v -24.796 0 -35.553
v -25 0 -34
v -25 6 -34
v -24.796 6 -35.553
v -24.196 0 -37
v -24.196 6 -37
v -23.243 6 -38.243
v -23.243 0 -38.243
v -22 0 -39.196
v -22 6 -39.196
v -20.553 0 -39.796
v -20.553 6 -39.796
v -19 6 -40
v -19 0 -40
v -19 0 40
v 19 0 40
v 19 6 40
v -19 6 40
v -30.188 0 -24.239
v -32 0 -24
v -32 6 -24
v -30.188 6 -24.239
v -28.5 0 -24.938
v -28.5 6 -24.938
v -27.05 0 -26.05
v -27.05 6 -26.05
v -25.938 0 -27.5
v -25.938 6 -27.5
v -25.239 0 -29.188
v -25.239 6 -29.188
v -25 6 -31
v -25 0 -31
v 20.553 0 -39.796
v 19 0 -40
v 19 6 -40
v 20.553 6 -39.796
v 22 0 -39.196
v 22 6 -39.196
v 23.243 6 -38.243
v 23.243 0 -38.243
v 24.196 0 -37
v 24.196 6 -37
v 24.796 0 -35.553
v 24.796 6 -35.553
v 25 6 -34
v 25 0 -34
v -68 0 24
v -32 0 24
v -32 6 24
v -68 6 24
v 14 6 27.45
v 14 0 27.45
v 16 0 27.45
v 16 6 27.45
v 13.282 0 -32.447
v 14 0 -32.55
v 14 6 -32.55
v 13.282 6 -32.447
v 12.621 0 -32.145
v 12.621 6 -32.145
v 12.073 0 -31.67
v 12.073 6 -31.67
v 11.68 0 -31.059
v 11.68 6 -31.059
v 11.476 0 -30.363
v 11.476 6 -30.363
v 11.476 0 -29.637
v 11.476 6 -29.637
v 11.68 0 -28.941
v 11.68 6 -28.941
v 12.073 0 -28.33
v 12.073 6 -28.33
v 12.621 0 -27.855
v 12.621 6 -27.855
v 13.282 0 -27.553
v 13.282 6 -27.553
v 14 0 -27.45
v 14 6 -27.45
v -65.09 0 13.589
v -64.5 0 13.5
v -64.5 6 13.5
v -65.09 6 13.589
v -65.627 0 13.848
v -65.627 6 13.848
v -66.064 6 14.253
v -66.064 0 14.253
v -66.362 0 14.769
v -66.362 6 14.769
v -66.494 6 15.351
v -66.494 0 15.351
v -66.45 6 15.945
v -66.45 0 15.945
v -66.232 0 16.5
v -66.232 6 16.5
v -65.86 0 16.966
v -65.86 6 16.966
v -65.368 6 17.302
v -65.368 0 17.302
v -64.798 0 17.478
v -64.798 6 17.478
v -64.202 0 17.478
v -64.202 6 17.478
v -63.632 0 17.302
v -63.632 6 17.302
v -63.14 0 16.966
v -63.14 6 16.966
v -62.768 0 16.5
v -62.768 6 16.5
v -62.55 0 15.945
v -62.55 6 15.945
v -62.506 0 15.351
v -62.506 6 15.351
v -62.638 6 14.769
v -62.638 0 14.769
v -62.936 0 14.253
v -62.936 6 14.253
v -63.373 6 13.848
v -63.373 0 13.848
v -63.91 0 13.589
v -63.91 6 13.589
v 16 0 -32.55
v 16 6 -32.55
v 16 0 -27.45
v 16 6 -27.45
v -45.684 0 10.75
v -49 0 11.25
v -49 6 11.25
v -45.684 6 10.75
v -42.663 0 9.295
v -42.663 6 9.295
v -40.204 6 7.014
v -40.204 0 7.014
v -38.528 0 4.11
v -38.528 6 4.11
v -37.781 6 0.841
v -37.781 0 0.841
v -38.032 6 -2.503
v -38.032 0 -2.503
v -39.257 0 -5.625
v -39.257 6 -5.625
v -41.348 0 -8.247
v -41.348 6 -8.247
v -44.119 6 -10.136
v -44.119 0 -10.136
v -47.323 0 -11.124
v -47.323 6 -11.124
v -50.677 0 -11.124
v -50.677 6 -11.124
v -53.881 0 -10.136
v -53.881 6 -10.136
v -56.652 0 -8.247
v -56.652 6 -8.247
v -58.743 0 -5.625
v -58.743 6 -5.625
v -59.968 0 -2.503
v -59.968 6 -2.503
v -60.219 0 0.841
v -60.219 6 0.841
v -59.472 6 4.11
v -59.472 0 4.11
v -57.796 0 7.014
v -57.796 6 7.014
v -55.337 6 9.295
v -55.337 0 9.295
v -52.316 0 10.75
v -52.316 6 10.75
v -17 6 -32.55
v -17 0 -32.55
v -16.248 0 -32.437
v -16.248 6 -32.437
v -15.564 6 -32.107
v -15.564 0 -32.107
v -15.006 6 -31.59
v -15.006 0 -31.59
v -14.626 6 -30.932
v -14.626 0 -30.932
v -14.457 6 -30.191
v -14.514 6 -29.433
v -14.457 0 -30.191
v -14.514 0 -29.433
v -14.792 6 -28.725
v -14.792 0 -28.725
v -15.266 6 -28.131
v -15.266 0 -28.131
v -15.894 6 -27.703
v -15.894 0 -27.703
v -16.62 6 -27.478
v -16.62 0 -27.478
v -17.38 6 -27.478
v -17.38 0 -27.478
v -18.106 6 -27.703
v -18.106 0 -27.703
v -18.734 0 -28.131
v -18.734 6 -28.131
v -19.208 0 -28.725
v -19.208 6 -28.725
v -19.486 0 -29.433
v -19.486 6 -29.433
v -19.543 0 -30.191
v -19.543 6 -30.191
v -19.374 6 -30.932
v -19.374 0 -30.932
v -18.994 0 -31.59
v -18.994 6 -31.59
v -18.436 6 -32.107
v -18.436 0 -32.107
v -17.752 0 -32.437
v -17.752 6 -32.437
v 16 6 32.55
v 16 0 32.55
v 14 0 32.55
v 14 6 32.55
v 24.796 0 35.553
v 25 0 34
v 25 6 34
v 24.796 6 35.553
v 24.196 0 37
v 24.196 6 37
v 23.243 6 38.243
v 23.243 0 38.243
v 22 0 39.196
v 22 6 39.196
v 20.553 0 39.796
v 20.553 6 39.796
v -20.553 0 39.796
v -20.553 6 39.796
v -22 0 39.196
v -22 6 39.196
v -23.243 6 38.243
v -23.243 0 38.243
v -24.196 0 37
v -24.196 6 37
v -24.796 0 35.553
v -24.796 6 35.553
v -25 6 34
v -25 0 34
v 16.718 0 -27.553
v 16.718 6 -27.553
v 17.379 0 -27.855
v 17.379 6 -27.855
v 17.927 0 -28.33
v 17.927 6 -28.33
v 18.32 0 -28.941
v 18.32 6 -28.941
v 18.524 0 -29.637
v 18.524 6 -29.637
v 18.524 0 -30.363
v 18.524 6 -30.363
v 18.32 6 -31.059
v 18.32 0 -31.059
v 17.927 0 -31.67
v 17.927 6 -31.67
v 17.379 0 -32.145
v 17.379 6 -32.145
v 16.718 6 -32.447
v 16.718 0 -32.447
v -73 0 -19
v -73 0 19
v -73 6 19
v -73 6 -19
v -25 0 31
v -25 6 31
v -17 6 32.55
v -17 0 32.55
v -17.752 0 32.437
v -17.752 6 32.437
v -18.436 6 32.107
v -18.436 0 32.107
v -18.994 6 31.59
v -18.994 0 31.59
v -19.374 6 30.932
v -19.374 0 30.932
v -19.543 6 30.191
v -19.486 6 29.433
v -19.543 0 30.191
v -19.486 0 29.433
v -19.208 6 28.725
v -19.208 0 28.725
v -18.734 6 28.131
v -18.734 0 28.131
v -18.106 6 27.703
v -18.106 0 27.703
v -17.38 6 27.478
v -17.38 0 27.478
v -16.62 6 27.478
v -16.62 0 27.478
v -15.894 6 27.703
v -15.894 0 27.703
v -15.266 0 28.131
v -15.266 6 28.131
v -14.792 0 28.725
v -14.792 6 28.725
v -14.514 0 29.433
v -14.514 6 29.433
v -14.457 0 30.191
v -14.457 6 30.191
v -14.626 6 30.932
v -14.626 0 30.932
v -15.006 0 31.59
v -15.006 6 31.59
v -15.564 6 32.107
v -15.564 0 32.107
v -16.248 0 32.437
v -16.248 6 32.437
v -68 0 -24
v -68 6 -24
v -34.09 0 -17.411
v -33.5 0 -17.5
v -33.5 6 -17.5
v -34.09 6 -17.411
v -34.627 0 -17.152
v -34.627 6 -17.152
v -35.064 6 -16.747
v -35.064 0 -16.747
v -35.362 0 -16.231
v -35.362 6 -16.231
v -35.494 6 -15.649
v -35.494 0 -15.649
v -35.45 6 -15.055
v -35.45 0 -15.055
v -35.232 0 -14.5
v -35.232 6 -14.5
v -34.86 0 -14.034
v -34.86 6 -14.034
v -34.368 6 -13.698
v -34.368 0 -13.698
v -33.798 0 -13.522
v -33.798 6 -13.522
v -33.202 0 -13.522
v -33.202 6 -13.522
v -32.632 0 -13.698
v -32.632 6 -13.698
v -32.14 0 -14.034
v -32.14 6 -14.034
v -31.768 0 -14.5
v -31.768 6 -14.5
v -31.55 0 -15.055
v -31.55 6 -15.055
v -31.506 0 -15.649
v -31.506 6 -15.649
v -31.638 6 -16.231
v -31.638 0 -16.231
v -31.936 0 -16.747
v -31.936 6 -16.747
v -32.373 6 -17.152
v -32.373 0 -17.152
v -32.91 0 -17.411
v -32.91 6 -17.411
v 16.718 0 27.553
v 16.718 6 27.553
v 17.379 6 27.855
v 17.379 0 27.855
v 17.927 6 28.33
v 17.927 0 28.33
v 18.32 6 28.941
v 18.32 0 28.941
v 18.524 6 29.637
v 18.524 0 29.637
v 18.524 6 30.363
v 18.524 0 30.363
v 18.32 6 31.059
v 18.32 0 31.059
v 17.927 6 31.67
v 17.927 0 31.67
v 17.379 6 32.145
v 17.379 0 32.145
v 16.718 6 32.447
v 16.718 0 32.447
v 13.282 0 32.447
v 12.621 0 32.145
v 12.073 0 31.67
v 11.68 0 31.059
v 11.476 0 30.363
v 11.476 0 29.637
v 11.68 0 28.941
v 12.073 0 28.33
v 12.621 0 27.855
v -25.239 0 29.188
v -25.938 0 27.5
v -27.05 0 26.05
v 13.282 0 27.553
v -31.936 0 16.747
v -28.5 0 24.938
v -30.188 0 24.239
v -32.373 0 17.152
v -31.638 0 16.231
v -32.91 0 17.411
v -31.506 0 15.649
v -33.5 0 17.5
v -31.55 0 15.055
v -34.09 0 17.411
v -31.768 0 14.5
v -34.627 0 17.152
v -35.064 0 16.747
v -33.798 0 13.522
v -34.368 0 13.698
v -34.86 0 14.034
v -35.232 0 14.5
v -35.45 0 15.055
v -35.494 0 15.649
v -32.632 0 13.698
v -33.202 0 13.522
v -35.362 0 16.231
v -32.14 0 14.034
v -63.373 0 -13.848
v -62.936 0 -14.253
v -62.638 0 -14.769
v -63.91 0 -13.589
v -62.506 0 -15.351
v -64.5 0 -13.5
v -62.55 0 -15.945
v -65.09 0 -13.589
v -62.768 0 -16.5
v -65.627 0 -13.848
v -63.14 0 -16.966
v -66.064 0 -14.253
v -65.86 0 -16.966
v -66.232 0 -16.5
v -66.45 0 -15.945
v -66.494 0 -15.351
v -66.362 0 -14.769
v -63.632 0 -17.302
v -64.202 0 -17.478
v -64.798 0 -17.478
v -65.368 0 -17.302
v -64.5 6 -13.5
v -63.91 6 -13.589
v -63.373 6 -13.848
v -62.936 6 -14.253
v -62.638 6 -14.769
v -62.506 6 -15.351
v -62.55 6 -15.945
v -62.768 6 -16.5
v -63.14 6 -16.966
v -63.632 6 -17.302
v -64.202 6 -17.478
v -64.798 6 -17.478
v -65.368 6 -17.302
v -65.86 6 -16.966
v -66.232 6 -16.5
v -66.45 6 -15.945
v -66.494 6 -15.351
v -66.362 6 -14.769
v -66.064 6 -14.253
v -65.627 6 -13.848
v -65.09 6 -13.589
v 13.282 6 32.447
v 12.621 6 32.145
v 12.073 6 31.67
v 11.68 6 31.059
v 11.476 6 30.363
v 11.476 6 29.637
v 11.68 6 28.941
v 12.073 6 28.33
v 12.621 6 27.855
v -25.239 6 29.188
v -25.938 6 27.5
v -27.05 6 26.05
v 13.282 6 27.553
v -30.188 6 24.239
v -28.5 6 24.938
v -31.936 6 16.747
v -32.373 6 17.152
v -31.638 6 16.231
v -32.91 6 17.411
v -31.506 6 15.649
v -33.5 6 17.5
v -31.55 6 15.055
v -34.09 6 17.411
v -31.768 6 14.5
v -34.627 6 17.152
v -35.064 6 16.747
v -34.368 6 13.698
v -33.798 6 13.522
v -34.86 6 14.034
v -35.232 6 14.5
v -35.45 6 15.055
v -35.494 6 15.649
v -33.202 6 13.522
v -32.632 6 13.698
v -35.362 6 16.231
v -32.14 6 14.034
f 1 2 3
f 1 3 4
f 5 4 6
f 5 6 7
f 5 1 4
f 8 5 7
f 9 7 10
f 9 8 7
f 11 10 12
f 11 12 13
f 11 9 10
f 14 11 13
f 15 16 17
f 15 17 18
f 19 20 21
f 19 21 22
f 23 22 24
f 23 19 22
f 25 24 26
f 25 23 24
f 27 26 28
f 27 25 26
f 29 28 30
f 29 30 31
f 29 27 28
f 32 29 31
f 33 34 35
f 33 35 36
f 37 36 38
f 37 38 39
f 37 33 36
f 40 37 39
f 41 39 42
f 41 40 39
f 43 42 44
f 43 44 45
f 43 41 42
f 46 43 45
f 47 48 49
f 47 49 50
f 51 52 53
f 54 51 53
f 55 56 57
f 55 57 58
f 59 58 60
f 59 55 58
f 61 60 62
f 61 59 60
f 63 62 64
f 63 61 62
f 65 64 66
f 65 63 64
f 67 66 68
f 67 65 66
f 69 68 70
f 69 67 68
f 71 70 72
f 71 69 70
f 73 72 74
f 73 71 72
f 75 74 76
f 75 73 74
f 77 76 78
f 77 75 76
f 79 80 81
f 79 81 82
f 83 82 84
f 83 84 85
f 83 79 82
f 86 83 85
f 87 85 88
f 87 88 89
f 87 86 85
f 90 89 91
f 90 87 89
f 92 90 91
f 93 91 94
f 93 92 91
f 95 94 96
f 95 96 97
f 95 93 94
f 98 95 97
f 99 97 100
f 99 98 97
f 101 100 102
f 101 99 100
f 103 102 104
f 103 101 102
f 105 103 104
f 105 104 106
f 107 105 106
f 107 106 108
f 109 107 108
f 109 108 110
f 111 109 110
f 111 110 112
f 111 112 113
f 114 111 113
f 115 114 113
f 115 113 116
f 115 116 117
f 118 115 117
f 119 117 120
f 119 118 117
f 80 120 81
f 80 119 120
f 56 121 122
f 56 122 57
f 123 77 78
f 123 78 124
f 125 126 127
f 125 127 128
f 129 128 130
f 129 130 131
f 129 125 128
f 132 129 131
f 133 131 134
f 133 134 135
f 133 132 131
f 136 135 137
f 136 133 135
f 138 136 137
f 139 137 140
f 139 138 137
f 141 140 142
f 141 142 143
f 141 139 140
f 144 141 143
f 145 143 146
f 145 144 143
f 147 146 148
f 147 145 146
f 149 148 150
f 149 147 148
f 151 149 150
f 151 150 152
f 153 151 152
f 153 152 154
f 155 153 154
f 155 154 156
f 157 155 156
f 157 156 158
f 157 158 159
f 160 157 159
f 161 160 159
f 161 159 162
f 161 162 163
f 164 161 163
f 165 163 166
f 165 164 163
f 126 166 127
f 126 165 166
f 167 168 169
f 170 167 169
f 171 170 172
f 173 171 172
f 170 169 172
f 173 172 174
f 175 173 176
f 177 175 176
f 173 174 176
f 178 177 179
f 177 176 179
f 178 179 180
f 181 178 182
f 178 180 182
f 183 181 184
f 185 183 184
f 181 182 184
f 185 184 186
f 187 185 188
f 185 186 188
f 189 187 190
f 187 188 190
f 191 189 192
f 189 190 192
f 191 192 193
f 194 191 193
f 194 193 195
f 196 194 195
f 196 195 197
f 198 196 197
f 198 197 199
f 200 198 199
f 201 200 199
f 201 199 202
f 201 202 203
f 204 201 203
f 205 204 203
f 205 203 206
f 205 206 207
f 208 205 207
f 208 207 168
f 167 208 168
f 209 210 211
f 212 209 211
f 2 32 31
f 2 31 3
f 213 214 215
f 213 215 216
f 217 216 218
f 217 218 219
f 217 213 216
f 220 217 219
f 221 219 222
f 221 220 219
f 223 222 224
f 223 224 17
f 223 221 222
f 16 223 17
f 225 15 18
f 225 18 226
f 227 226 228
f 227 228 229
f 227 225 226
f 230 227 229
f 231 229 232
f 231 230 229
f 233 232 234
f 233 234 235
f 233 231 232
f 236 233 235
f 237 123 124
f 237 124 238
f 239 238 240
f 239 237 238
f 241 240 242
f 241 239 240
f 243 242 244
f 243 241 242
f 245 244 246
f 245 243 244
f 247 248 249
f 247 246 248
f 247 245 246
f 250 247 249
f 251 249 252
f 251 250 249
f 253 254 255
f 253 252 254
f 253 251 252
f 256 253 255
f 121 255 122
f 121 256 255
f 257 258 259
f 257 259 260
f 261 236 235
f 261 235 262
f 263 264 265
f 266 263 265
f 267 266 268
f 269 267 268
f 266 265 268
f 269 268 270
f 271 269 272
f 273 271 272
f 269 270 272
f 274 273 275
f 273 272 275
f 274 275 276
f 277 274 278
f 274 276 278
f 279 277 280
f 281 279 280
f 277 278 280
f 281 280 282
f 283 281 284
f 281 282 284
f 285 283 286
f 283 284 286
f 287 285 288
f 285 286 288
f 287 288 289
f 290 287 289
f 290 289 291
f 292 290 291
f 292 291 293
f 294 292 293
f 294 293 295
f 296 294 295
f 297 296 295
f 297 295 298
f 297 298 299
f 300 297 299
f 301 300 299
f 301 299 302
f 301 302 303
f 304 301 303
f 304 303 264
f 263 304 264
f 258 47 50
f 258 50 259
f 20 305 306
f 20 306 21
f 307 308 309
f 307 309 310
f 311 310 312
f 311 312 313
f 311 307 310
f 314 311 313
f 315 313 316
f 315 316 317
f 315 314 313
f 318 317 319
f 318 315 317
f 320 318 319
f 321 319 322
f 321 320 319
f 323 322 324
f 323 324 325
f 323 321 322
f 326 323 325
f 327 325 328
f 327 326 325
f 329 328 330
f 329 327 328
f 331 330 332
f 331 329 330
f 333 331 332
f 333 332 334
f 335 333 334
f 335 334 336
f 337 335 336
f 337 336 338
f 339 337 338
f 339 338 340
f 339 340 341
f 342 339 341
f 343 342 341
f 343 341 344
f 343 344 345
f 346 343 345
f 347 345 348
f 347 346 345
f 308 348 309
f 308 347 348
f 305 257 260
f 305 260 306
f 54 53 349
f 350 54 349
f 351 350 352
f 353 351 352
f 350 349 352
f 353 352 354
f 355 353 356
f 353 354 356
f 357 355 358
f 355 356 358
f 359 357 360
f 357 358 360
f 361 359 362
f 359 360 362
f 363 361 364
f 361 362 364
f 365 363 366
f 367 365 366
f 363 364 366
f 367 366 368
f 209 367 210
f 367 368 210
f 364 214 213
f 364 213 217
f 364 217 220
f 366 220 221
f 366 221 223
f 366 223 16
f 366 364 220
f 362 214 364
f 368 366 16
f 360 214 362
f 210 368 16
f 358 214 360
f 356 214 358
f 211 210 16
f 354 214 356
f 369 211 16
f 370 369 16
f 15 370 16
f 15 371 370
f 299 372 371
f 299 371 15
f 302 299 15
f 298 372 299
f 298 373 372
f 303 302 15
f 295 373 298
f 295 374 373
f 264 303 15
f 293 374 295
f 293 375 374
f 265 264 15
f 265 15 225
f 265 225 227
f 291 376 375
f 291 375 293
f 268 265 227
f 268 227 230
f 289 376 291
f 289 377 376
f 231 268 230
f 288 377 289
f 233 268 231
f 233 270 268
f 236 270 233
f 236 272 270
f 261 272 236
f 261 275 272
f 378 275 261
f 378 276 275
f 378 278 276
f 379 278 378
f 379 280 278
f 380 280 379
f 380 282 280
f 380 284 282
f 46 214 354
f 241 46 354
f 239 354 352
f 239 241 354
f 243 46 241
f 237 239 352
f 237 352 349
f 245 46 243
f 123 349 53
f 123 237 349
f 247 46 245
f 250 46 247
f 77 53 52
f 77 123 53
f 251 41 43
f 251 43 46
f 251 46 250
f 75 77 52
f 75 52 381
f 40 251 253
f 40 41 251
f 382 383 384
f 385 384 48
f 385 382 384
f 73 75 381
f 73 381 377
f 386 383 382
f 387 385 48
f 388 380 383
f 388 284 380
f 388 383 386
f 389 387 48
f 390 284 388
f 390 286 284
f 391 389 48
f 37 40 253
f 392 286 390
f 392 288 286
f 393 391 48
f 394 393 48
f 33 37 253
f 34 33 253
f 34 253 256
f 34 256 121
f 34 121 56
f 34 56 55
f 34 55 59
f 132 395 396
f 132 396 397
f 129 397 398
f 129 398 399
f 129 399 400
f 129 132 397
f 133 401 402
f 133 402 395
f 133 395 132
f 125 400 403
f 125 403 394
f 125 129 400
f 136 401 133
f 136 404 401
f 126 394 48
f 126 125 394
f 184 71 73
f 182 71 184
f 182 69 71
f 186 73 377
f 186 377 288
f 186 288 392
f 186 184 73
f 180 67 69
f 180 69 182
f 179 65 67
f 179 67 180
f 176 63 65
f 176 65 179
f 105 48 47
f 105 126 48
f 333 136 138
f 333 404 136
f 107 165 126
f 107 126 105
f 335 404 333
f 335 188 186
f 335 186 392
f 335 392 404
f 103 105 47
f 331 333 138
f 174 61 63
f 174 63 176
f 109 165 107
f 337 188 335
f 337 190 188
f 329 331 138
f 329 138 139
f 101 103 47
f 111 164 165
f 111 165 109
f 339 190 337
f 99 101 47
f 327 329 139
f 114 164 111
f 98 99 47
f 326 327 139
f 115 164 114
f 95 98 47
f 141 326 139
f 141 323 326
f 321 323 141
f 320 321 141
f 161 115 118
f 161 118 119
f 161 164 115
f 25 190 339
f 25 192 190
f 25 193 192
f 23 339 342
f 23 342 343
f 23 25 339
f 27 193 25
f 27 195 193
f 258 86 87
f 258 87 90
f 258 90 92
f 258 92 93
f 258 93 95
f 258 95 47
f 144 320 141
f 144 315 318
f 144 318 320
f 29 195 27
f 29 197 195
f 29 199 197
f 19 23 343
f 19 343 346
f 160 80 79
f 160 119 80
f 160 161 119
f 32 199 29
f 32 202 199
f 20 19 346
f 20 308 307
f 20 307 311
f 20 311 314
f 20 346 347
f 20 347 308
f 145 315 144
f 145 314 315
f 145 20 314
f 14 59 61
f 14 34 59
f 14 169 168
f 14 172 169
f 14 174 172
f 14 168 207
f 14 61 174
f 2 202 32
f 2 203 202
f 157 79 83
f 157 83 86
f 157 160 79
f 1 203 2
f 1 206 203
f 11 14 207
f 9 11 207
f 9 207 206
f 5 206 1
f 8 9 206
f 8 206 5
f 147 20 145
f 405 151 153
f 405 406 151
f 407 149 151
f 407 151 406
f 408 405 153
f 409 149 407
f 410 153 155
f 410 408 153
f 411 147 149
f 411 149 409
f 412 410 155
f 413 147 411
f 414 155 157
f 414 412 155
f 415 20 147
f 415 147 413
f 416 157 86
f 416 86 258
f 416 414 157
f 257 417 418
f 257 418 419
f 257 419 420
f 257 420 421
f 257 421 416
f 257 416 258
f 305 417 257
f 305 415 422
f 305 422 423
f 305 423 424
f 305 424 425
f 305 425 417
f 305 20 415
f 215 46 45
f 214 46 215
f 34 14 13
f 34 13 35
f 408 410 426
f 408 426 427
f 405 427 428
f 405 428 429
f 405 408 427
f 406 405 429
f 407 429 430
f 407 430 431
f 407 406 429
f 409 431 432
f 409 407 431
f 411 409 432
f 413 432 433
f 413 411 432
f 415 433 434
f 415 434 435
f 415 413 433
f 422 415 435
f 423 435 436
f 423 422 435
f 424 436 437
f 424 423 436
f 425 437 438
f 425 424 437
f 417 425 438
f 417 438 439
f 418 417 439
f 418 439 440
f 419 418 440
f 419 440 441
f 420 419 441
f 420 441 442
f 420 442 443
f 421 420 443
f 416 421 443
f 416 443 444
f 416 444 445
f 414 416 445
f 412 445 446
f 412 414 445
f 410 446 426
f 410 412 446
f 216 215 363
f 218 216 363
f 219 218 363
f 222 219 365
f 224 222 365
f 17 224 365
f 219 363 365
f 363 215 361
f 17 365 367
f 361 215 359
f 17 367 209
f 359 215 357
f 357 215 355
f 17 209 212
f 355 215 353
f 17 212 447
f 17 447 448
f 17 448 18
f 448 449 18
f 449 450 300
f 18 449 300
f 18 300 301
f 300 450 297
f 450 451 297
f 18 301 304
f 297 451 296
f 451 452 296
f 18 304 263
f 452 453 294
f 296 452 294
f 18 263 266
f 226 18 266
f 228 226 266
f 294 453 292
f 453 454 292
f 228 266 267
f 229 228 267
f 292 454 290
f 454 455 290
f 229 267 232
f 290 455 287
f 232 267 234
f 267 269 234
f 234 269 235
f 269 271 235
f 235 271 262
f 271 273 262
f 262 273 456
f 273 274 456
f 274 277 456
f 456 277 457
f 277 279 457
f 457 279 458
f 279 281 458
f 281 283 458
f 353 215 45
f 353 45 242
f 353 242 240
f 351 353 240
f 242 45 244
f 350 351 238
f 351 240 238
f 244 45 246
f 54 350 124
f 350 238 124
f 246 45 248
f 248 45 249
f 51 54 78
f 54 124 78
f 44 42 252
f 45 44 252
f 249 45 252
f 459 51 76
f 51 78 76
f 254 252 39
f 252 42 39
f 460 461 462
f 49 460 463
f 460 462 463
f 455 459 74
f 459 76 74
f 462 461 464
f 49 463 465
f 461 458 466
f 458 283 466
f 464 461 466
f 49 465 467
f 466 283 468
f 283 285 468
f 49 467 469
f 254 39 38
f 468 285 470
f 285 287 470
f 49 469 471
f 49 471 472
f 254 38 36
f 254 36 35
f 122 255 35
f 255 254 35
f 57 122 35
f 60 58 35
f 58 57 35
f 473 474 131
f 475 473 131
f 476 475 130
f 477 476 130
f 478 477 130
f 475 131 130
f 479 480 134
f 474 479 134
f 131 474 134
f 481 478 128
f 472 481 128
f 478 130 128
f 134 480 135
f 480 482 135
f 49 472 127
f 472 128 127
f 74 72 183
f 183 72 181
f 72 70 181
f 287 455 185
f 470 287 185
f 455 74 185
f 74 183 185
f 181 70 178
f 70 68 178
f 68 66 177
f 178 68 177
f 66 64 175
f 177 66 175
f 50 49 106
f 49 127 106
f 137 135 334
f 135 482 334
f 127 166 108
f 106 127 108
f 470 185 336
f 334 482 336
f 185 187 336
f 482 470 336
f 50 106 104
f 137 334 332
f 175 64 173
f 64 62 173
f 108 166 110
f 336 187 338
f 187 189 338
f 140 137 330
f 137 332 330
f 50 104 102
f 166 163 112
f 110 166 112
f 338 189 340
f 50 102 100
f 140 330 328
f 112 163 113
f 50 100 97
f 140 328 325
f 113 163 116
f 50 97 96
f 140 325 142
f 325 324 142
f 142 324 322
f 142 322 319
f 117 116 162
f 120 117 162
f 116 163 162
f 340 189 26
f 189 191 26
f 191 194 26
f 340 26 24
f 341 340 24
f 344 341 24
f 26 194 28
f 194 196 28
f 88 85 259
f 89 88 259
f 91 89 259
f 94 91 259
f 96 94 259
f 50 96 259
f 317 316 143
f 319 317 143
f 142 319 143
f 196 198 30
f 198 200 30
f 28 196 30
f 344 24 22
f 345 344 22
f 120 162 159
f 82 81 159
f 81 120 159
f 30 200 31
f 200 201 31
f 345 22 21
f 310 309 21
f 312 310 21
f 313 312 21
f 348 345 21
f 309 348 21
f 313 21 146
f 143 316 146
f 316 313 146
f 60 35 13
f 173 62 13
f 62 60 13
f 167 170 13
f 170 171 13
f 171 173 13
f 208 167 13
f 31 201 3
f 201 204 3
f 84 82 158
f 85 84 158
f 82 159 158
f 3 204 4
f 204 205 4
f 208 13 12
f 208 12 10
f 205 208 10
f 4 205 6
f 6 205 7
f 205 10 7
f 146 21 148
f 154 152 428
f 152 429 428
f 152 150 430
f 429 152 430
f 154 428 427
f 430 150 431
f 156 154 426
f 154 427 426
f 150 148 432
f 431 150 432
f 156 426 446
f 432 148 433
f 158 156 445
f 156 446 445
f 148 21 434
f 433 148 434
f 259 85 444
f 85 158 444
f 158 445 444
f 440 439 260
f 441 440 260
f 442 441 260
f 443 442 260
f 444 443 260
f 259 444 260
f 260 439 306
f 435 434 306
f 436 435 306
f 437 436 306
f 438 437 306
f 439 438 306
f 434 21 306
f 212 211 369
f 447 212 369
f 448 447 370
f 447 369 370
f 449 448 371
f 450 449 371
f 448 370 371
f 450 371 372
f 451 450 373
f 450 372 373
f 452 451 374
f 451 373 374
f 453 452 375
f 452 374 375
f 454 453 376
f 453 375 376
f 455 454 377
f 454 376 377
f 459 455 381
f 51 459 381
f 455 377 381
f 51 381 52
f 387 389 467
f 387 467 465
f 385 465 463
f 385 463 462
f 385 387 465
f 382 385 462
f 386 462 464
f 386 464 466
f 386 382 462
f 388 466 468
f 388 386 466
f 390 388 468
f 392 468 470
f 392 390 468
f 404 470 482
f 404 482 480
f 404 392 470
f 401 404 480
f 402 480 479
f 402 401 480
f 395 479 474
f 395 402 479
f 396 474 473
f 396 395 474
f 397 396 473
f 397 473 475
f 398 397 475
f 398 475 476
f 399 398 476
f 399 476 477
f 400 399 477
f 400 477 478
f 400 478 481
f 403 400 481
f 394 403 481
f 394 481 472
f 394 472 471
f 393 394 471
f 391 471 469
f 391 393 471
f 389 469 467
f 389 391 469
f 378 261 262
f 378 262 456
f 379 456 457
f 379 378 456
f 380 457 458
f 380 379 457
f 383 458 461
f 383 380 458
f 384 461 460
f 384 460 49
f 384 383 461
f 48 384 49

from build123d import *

# Parameters (mm, degrees)
SKETCH_1_R          = 11.25
SKETCH_1_R_2        = 2
EXTRUDE_1_DEPTH     = 6
SKETCH_2_R          = 2.55
CUT_EXTRUDE_1_DEPTH = 84.456575535


with BuildPart() as part:
    # Эскиз1 → Бобышка-Вытянуть1 (new body)
    with BuildSketch(Plane(origin=(0, 0, 0), x_dir=(1, 0, 0), z_dir=(0, 1, 0))):
        with BuildLine():
            Line((-32, -24), (-68, -24))
            Line((-68, -24), (-73, -19))
            Line((-73, -19), (-73, 19))
            Line((-73, 19), (-68, 24))
            Line((-68, 24), (-32, 24))
            ThreePointArc((-32, 24), (-27.050252532, 26.050252532), (-25, 31))
            Line((-25, 31), (-25, 34))
            ThreePointArc((-25, 34), (-23.242640687, 38.242640687), (-19, 40))
            Line((-19, 40), (19, 40))
            ThreePointArc((19, 40), (23.242640687, 38.242640687), (25, 34))
            Line((25, 34), (25, -34))
            ThreePointArc((25, -34), (23.242640687, -38.242640687), (19, -40))
            Line((19, -40), (-19, -40))
            ThreePointArc((-19, -40), (-23.242640687, -38.242640687), (-25, -34))
            Line((-25, -34), (-25, -31))
            ThreePointArc((-25, -31), (-27.050252532, -26.050252532), (-32, -24))
        make_face()
        with Locations(Location((-49, 0, 0), (0, 0, 270))):
            Circle(SKETCH_1_R, mode=Mode.SUBTRACT)
        with Locations(Location((-64.5, 15.5, 0), (0, 0, 270))):
            Circle(SKETCH_1_R_2, mode=Mode.SUBTRACT)
        with Locations(Location((-64.5, -15.5, 0), (0, 0, 90))):
            Circle(SKETCH_1_R_2, mode=Mode.SUBTRACT)
        with Locations(Location((-33.5, 15.5, 0), (0, 0, 90))):
            Circle(SKETCH_1_R_2, mode=Mode.SUBTRACT)
        with Locations(Location((-33.5, -15.5, 0), (0, 0, 270))):
            Circle(SKETCH_1_R_2, mode=Mode.SUBTRACT)
    extrude(amount=EXTRUDE_1_DEPTH)

    # Эскиз2 → Вырез-Вытянуть1 (cut, through all)
    with BuildSketch(Plane.XZ):
        with Locations(Location((-17, -30, 0), (0, 0, 270))):
            Circle(SKETCH_2_R)
        with Locations(Location((-17, 30, 0), (0, 0, 90))):
            Circle(SKETCH_2_R)
        with BuildLine():
            Line((16, -32.55), (14, -32.55))
            ThreePointArc((14, -32.55), (11.45, -30), (14, -27.45))
            Line((14, -27.45), (16, -27.45))
            ThreePointArc((16, -27.45), (18.55, -30), (16, -32.55))
        make_face()
        with BuildLine():
            Line((16, 32.55), (14, 32.55))
            ThreePointArc((14, 32.55), (11.45, 30), (14, 27.45))
            Line((14, 27.45), (16, 27.45))
            ThreePointArc((16, 27.45), (18.55, 30), (16, 32.55))
        make_face()
    extrude(amount=-CUT_EXTRUDE_1_DEPTH, mode=Mode.SUBTRACT)


solid = part.part
